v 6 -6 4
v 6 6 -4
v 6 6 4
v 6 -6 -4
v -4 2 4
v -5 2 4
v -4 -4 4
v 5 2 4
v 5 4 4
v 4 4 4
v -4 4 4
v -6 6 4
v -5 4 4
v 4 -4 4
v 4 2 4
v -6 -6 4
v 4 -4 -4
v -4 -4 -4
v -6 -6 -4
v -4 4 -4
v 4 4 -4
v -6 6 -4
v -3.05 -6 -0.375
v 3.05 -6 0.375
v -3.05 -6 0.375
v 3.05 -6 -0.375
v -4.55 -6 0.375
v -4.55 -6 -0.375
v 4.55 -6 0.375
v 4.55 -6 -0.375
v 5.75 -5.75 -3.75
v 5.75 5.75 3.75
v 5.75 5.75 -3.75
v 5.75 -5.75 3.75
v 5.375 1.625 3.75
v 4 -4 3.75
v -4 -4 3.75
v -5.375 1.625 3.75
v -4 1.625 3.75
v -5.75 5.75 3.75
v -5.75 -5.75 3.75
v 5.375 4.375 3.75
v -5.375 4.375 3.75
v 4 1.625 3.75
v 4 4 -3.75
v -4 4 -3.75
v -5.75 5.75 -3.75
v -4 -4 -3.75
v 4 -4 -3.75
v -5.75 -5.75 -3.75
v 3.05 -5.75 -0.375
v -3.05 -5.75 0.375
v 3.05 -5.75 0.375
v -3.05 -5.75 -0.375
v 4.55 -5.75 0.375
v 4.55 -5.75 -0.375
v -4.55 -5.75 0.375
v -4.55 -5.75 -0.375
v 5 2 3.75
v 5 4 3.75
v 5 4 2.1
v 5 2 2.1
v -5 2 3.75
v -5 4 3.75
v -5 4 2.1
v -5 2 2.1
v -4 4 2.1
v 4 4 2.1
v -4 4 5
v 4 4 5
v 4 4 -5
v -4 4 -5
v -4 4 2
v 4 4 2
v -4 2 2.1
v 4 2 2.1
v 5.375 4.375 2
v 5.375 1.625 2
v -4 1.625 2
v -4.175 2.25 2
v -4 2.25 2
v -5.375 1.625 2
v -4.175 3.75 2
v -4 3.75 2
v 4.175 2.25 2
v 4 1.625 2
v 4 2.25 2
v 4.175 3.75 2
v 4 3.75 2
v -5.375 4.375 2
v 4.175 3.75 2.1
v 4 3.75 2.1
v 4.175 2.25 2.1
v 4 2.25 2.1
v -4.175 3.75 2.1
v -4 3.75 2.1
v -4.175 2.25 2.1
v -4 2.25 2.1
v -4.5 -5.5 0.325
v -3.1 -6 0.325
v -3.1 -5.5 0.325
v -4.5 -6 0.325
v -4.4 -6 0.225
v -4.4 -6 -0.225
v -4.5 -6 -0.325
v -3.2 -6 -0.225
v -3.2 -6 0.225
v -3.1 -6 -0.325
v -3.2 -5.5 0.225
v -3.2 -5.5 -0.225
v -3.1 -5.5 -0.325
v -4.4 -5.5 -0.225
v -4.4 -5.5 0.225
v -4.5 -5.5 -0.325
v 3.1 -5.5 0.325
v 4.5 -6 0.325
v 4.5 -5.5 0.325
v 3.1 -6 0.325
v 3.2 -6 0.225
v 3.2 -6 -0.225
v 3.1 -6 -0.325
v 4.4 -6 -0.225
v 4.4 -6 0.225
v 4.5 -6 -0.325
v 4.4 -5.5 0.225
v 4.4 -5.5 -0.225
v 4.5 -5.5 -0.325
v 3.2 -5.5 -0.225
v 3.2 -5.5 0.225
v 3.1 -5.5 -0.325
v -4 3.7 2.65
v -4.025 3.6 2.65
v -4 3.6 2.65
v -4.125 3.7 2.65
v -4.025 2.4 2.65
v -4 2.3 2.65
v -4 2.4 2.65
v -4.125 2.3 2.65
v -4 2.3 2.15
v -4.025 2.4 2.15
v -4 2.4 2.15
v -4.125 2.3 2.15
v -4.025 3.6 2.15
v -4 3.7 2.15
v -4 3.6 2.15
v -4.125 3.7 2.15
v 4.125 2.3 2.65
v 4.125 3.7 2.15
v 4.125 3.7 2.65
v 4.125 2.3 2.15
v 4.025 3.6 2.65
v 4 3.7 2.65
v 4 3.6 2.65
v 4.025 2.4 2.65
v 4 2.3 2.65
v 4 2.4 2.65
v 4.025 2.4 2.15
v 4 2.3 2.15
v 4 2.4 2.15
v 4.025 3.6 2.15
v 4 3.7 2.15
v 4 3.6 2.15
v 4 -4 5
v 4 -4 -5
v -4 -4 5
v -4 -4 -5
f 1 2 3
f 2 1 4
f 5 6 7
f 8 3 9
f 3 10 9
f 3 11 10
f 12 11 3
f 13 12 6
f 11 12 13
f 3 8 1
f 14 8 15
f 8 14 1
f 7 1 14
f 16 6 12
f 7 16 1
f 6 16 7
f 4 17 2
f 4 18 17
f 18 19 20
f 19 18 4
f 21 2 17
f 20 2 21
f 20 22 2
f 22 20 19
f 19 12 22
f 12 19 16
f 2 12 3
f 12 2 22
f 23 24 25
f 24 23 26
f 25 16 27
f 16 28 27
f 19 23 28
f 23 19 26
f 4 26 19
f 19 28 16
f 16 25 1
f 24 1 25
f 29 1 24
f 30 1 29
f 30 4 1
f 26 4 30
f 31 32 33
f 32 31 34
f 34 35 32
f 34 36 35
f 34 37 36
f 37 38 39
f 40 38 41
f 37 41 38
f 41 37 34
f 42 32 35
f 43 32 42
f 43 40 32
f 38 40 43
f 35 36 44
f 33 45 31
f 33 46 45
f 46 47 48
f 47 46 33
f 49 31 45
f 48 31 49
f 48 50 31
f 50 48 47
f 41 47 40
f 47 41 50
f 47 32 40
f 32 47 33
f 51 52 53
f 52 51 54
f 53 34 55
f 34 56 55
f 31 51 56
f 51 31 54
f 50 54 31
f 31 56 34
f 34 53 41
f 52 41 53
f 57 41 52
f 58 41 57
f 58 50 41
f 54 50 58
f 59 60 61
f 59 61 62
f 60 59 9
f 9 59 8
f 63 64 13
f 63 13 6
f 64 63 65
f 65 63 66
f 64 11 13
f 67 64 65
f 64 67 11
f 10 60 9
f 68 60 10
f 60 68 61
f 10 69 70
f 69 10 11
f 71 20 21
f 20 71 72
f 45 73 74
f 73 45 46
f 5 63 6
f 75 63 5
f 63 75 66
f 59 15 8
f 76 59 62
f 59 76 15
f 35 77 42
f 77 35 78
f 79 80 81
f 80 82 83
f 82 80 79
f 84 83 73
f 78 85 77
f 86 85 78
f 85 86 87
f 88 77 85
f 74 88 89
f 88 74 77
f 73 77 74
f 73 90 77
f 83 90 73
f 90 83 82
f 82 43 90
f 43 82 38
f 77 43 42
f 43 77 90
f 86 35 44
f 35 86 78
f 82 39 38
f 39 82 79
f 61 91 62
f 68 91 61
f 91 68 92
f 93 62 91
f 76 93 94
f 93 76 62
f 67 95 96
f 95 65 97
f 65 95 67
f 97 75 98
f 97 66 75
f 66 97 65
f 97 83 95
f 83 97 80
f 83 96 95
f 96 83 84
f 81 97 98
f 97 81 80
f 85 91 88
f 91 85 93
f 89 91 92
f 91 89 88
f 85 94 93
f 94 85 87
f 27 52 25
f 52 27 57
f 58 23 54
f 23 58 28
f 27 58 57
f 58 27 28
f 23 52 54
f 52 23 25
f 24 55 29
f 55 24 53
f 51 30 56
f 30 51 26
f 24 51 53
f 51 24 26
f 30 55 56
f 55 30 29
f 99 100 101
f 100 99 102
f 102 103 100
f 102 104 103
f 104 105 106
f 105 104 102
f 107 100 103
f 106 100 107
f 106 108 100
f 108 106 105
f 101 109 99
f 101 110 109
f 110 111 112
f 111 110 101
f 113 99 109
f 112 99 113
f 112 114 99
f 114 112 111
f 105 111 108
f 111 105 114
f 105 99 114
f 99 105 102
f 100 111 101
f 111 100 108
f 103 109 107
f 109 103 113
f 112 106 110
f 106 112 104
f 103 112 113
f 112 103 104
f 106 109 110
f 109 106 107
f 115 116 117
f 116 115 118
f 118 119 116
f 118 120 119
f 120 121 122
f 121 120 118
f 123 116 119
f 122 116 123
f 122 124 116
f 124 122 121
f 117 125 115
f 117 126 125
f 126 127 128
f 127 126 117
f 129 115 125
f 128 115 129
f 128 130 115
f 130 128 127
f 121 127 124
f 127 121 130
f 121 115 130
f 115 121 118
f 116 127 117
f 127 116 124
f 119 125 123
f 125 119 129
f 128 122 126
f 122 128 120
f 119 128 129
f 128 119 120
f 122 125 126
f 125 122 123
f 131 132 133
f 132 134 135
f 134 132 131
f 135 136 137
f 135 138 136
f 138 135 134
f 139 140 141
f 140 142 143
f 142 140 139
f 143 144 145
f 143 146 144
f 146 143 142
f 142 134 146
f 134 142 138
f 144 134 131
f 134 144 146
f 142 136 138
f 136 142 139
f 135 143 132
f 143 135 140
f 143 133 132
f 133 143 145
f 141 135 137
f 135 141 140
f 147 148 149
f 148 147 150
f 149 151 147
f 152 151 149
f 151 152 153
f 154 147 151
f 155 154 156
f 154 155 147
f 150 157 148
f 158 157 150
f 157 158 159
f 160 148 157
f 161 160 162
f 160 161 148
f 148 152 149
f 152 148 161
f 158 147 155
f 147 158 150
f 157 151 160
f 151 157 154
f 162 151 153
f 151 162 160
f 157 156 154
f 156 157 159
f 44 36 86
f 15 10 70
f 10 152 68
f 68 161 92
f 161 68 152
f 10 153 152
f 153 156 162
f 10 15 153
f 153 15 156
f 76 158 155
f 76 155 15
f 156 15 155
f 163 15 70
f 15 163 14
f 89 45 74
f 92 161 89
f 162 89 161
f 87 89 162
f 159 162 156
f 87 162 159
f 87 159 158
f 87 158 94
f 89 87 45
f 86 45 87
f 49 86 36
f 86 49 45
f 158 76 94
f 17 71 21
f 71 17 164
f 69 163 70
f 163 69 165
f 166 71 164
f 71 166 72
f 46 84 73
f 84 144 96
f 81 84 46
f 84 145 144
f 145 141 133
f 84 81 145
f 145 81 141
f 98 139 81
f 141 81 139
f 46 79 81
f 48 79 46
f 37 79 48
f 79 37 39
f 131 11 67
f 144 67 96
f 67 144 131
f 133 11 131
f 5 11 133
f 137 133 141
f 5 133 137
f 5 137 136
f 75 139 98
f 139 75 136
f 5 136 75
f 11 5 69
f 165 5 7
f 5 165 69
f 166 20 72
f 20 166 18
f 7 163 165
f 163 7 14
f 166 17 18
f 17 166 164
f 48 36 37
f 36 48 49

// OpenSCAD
//All units are in cm

module usb_port ()
{
	difference() {
		cube([0.65, 1.4, .5], center=true);
		cube([0.45, 1.2, .6], center=true);
	}
}

module female_header ()
{
	difference() {
		cube([0.3, 0.3, 0.9], center=true);
		cube([0.1, 0.1, 1], center=true);
	}
}

module console_body()
{
	difference() {
		union() {
			difference() {
				difference() {
					// The main body, hollow
					cube([12, 12, 8], center=true);
					cube([11.5, 11.5, 7.5], center=true);
				}

				// Slot cutout
				translate([0, 3, 3.1]) {
					cube([10, 2, 2.1], center=true);
				}
			}
			
			difference() {
				// The physical Slot (the part that collects dust and soda)
				translate([0, 3, 3.1]) {
					difference() {
						translate([0, 0, -.1]) {
							cube([10.75, 2.75, 2], center=true);
						}
						cube([10, 2, 2], center=true);
					}
				}

				// Cutouts for Slot USB in physical slot
				for(i=[-1, 1]) {
					translate([3.8*i, 3, 2]){
						cube([0.75, 1.5, 0.7], center=true);
					}
				}
			}
		}
		
		// Front USB cutouts
		for(i=[-1, 1]) {
			translate([3.8*i, -6, 0]){
				rotate([90, 90, 0]) {
					cube([0.75, 1.5, 0.7], center=true);
				}
			}
		}
	}
}

module console()
{
	// Console Shell
	console_body();

	// USB ports on front
	translate([0, -5.75, 0]) {
		rotate([90, 0, 0]) {
			for(i=[-1, 1]) {
				translate([3.8*i, 0, 0]) {
					rotate([0, 0, 90]) {
						usb_port();
					}
				}
			}
		}
	}

	cube([8, 8, 10], center=true);

	// USB ports in Slot
	for(i=[-1, 1]) {
		translate([3.8*i, 3, 3-.6]) {
			usb_port();
		}
	}

	// GPIO
	translate([-((13*0.254)/2), 3, 2]){
		for(i = [0:13]) {
			for(j=[-1, 1]) {
				translate([i*0.254, (0.254/2)*j, 0]) {
					female_header();
				}
			}
		}
	}

	// The following are not specified because the specification doesn't care.
	// TODO: HDMI Jack
	// TODO: Power Jack
	// TODO: Ethernet Jack
	// TODO: RCA Video Jack
	// TODO: 3.5mm Phono Jack

}

console();
